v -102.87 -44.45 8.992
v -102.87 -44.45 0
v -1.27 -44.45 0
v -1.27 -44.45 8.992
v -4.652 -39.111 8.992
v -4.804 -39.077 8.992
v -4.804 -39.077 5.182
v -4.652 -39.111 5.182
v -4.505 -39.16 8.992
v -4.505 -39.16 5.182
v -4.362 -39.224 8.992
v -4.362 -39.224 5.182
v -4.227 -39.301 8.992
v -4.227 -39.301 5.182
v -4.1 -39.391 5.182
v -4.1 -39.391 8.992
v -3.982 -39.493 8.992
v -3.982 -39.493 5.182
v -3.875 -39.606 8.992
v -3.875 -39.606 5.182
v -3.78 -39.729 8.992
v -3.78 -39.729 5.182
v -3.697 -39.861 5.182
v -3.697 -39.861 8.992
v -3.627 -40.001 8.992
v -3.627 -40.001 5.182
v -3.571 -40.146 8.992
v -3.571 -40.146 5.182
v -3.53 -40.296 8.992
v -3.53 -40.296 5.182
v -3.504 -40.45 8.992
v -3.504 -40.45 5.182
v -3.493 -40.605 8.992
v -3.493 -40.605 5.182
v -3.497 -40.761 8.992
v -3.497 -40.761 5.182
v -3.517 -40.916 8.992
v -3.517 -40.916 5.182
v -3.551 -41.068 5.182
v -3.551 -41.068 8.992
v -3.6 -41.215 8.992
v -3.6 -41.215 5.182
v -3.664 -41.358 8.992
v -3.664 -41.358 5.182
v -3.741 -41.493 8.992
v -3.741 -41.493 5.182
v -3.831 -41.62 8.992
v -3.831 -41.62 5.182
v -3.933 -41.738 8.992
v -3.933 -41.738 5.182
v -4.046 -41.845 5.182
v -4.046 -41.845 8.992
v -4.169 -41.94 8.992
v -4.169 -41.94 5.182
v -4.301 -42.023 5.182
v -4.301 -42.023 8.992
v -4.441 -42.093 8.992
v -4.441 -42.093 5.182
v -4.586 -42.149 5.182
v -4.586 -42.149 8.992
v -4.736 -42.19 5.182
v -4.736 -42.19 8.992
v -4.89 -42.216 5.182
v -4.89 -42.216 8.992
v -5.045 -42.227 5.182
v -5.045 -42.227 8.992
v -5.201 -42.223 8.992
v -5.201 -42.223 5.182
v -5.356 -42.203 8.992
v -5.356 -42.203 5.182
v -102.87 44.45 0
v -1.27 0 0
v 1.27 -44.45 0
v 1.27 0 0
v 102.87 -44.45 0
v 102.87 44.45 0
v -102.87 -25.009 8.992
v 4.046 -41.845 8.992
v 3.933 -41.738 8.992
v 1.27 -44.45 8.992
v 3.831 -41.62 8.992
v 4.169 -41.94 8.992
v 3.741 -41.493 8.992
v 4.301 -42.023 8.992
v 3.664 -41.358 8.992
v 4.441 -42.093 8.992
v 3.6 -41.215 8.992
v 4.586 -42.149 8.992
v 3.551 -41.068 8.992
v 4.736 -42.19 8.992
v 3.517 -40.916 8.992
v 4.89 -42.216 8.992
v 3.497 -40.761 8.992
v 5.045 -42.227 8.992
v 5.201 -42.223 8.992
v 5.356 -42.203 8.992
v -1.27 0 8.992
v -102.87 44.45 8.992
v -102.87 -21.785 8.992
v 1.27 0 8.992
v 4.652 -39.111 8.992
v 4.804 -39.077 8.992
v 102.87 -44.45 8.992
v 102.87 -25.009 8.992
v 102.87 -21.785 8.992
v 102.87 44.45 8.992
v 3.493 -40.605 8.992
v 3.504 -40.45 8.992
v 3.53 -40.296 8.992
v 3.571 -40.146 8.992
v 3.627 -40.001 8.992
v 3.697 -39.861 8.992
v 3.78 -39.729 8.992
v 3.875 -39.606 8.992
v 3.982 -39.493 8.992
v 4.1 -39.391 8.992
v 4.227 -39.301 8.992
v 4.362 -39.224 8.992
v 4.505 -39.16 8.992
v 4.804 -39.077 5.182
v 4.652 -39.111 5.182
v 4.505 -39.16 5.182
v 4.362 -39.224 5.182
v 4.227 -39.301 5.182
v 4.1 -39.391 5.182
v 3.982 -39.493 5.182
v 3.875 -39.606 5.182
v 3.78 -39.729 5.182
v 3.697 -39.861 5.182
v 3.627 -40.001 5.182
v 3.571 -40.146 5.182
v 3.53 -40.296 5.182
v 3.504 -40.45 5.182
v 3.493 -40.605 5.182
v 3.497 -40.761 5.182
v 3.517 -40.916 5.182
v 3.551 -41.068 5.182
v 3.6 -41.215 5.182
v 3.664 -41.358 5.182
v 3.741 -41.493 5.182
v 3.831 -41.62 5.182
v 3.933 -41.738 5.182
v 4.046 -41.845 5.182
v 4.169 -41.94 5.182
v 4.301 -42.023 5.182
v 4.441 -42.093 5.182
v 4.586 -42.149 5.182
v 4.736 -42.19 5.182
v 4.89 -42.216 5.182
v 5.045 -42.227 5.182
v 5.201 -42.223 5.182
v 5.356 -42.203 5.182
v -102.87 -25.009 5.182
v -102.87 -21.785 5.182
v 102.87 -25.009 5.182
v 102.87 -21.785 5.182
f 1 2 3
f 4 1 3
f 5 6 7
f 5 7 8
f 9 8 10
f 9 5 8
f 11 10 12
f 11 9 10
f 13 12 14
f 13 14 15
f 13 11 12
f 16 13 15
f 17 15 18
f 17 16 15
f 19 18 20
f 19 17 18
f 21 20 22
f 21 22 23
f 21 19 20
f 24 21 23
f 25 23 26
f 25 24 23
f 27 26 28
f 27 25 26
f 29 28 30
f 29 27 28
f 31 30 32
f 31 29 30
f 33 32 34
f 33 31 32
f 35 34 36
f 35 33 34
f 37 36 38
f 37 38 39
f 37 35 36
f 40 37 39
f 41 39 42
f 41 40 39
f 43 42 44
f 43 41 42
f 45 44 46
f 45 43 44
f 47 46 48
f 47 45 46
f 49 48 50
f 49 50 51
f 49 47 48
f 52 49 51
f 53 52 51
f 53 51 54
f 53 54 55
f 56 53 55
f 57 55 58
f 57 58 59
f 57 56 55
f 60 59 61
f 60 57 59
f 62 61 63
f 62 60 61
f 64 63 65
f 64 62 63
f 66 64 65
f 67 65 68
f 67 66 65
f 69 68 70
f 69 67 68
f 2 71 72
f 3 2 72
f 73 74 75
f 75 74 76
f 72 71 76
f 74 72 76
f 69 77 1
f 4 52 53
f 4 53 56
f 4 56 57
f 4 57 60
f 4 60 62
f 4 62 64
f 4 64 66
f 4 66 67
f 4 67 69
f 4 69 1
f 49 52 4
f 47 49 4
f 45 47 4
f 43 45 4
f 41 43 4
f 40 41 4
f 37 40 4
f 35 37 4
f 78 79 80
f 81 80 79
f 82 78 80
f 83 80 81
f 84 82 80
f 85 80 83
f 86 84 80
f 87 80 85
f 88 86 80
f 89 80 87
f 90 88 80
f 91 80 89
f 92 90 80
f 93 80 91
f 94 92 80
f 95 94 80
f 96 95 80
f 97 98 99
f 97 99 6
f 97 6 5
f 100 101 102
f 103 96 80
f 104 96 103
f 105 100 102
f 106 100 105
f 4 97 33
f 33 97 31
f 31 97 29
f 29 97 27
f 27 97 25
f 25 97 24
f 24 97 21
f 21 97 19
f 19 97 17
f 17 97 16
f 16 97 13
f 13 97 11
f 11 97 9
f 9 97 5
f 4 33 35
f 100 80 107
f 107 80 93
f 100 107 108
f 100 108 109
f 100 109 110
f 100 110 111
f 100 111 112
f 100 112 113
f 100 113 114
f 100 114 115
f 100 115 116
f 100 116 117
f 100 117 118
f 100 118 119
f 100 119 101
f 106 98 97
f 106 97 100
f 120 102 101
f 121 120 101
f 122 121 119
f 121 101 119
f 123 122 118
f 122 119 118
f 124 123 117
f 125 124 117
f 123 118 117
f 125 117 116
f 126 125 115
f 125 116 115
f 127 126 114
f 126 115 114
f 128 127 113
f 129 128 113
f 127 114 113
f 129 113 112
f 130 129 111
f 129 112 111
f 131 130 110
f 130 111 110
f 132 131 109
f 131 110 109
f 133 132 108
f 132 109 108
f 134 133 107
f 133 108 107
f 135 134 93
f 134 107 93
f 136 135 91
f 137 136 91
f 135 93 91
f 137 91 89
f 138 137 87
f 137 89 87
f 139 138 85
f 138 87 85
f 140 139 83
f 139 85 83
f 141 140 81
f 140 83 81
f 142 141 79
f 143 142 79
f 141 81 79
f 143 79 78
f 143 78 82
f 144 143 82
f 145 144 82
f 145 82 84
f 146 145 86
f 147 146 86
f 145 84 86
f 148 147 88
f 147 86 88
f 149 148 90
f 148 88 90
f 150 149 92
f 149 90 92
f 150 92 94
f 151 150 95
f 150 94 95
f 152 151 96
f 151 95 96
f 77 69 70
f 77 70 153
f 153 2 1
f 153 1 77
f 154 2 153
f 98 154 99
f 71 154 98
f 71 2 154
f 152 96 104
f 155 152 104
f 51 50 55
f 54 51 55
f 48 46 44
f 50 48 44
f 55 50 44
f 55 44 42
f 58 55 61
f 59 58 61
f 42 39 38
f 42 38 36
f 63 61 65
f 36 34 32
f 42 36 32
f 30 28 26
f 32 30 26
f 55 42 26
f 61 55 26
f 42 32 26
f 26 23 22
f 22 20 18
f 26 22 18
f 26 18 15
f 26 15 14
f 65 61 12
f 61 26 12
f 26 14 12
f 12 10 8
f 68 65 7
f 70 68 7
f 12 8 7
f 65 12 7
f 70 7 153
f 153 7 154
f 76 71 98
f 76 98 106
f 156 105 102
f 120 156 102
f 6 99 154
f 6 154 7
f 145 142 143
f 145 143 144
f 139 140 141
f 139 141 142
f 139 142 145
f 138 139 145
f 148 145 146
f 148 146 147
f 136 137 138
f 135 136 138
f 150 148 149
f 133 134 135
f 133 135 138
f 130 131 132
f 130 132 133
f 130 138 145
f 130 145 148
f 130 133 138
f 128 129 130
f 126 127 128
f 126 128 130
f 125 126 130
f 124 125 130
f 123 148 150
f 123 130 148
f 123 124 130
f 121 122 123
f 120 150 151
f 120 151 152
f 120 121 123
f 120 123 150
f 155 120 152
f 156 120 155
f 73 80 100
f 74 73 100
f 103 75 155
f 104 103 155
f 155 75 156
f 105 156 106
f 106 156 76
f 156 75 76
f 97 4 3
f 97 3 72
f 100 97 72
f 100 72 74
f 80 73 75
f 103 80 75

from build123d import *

# Parameters (mm, degrees)
SKETCH1_W           = 205.74
SKETCH1_H           = 88.9
BOSS_EXTRUDE1_DEPTH = 8.9916
SKETCH2_W           = 2.54
SKETCH2_H           = 44.45
CUT_EXTRUDE1_DEPTH  = 8.9916
CUT_EXTRUDE3_DEPTH  = 3.81


with BuildPart() as part:
    # Sketch1 → Boss-Extrude1 (new body)
    with BuildSketch(Plane.XY):
        Rectangle(SKETCH1_W, SKETCH1_H)
    extrude(amount=BOSS_EXTRUDE1_DEPTH)

    # Sketch2 → Cut-Extrude1 (cut)
    with BuildSketch(Plane.XY.offset(8.9916)):
        with Locations((0, -22.225)):
            Rectangle(SKETCH2_W, SKETCH2_H)
    extrude(amount=-CUT_EXTRUDE1_DEPTH, mode=Mode.SUBTRACT)

    # Sketch4 → Cut-Extrude3 (cut)
    with BuildSketch(Plane.XY.offset(8.9916)):
        with BuildLine():
            Line((-200.384333518, -4.590586805), (-4.804333518, -39.076617692))
            ThreePointArc((-4.804333518, -39.076617692), (-3.516617692, -40.915666482), (-5.355666482, -42.203382308))
            Line((-5.355666482, -42.203382308), (-200.935666482, -7.717351421))
            ThreePointArc((-200.935666482, -7.717351421), (-202.223382308, -5.878302631), (-200.384333518, -4.590586805))
        make_face()
        with BuildLine():
            Line((200.384333518, -4.590586805), (4.804333518, -39.076617692))
            ThreePointArc((4.804333518, -39.076617692), (3.516617692, -40.915666482), (5.355666482, -42.203382308))
            Line((5.355666482, -42.203382308), (200.935666482, -7.717351421))
            ThreePointArc((200.935666482, -7.717351421), (202.223382308, -5.878302631), (200.384333518, -4.590586805))
        make_face()
    extrude(amount=-CUT_EXTRUDE3_DEPTH, mode=Mode.SUBTRACT)


solid = part.part
